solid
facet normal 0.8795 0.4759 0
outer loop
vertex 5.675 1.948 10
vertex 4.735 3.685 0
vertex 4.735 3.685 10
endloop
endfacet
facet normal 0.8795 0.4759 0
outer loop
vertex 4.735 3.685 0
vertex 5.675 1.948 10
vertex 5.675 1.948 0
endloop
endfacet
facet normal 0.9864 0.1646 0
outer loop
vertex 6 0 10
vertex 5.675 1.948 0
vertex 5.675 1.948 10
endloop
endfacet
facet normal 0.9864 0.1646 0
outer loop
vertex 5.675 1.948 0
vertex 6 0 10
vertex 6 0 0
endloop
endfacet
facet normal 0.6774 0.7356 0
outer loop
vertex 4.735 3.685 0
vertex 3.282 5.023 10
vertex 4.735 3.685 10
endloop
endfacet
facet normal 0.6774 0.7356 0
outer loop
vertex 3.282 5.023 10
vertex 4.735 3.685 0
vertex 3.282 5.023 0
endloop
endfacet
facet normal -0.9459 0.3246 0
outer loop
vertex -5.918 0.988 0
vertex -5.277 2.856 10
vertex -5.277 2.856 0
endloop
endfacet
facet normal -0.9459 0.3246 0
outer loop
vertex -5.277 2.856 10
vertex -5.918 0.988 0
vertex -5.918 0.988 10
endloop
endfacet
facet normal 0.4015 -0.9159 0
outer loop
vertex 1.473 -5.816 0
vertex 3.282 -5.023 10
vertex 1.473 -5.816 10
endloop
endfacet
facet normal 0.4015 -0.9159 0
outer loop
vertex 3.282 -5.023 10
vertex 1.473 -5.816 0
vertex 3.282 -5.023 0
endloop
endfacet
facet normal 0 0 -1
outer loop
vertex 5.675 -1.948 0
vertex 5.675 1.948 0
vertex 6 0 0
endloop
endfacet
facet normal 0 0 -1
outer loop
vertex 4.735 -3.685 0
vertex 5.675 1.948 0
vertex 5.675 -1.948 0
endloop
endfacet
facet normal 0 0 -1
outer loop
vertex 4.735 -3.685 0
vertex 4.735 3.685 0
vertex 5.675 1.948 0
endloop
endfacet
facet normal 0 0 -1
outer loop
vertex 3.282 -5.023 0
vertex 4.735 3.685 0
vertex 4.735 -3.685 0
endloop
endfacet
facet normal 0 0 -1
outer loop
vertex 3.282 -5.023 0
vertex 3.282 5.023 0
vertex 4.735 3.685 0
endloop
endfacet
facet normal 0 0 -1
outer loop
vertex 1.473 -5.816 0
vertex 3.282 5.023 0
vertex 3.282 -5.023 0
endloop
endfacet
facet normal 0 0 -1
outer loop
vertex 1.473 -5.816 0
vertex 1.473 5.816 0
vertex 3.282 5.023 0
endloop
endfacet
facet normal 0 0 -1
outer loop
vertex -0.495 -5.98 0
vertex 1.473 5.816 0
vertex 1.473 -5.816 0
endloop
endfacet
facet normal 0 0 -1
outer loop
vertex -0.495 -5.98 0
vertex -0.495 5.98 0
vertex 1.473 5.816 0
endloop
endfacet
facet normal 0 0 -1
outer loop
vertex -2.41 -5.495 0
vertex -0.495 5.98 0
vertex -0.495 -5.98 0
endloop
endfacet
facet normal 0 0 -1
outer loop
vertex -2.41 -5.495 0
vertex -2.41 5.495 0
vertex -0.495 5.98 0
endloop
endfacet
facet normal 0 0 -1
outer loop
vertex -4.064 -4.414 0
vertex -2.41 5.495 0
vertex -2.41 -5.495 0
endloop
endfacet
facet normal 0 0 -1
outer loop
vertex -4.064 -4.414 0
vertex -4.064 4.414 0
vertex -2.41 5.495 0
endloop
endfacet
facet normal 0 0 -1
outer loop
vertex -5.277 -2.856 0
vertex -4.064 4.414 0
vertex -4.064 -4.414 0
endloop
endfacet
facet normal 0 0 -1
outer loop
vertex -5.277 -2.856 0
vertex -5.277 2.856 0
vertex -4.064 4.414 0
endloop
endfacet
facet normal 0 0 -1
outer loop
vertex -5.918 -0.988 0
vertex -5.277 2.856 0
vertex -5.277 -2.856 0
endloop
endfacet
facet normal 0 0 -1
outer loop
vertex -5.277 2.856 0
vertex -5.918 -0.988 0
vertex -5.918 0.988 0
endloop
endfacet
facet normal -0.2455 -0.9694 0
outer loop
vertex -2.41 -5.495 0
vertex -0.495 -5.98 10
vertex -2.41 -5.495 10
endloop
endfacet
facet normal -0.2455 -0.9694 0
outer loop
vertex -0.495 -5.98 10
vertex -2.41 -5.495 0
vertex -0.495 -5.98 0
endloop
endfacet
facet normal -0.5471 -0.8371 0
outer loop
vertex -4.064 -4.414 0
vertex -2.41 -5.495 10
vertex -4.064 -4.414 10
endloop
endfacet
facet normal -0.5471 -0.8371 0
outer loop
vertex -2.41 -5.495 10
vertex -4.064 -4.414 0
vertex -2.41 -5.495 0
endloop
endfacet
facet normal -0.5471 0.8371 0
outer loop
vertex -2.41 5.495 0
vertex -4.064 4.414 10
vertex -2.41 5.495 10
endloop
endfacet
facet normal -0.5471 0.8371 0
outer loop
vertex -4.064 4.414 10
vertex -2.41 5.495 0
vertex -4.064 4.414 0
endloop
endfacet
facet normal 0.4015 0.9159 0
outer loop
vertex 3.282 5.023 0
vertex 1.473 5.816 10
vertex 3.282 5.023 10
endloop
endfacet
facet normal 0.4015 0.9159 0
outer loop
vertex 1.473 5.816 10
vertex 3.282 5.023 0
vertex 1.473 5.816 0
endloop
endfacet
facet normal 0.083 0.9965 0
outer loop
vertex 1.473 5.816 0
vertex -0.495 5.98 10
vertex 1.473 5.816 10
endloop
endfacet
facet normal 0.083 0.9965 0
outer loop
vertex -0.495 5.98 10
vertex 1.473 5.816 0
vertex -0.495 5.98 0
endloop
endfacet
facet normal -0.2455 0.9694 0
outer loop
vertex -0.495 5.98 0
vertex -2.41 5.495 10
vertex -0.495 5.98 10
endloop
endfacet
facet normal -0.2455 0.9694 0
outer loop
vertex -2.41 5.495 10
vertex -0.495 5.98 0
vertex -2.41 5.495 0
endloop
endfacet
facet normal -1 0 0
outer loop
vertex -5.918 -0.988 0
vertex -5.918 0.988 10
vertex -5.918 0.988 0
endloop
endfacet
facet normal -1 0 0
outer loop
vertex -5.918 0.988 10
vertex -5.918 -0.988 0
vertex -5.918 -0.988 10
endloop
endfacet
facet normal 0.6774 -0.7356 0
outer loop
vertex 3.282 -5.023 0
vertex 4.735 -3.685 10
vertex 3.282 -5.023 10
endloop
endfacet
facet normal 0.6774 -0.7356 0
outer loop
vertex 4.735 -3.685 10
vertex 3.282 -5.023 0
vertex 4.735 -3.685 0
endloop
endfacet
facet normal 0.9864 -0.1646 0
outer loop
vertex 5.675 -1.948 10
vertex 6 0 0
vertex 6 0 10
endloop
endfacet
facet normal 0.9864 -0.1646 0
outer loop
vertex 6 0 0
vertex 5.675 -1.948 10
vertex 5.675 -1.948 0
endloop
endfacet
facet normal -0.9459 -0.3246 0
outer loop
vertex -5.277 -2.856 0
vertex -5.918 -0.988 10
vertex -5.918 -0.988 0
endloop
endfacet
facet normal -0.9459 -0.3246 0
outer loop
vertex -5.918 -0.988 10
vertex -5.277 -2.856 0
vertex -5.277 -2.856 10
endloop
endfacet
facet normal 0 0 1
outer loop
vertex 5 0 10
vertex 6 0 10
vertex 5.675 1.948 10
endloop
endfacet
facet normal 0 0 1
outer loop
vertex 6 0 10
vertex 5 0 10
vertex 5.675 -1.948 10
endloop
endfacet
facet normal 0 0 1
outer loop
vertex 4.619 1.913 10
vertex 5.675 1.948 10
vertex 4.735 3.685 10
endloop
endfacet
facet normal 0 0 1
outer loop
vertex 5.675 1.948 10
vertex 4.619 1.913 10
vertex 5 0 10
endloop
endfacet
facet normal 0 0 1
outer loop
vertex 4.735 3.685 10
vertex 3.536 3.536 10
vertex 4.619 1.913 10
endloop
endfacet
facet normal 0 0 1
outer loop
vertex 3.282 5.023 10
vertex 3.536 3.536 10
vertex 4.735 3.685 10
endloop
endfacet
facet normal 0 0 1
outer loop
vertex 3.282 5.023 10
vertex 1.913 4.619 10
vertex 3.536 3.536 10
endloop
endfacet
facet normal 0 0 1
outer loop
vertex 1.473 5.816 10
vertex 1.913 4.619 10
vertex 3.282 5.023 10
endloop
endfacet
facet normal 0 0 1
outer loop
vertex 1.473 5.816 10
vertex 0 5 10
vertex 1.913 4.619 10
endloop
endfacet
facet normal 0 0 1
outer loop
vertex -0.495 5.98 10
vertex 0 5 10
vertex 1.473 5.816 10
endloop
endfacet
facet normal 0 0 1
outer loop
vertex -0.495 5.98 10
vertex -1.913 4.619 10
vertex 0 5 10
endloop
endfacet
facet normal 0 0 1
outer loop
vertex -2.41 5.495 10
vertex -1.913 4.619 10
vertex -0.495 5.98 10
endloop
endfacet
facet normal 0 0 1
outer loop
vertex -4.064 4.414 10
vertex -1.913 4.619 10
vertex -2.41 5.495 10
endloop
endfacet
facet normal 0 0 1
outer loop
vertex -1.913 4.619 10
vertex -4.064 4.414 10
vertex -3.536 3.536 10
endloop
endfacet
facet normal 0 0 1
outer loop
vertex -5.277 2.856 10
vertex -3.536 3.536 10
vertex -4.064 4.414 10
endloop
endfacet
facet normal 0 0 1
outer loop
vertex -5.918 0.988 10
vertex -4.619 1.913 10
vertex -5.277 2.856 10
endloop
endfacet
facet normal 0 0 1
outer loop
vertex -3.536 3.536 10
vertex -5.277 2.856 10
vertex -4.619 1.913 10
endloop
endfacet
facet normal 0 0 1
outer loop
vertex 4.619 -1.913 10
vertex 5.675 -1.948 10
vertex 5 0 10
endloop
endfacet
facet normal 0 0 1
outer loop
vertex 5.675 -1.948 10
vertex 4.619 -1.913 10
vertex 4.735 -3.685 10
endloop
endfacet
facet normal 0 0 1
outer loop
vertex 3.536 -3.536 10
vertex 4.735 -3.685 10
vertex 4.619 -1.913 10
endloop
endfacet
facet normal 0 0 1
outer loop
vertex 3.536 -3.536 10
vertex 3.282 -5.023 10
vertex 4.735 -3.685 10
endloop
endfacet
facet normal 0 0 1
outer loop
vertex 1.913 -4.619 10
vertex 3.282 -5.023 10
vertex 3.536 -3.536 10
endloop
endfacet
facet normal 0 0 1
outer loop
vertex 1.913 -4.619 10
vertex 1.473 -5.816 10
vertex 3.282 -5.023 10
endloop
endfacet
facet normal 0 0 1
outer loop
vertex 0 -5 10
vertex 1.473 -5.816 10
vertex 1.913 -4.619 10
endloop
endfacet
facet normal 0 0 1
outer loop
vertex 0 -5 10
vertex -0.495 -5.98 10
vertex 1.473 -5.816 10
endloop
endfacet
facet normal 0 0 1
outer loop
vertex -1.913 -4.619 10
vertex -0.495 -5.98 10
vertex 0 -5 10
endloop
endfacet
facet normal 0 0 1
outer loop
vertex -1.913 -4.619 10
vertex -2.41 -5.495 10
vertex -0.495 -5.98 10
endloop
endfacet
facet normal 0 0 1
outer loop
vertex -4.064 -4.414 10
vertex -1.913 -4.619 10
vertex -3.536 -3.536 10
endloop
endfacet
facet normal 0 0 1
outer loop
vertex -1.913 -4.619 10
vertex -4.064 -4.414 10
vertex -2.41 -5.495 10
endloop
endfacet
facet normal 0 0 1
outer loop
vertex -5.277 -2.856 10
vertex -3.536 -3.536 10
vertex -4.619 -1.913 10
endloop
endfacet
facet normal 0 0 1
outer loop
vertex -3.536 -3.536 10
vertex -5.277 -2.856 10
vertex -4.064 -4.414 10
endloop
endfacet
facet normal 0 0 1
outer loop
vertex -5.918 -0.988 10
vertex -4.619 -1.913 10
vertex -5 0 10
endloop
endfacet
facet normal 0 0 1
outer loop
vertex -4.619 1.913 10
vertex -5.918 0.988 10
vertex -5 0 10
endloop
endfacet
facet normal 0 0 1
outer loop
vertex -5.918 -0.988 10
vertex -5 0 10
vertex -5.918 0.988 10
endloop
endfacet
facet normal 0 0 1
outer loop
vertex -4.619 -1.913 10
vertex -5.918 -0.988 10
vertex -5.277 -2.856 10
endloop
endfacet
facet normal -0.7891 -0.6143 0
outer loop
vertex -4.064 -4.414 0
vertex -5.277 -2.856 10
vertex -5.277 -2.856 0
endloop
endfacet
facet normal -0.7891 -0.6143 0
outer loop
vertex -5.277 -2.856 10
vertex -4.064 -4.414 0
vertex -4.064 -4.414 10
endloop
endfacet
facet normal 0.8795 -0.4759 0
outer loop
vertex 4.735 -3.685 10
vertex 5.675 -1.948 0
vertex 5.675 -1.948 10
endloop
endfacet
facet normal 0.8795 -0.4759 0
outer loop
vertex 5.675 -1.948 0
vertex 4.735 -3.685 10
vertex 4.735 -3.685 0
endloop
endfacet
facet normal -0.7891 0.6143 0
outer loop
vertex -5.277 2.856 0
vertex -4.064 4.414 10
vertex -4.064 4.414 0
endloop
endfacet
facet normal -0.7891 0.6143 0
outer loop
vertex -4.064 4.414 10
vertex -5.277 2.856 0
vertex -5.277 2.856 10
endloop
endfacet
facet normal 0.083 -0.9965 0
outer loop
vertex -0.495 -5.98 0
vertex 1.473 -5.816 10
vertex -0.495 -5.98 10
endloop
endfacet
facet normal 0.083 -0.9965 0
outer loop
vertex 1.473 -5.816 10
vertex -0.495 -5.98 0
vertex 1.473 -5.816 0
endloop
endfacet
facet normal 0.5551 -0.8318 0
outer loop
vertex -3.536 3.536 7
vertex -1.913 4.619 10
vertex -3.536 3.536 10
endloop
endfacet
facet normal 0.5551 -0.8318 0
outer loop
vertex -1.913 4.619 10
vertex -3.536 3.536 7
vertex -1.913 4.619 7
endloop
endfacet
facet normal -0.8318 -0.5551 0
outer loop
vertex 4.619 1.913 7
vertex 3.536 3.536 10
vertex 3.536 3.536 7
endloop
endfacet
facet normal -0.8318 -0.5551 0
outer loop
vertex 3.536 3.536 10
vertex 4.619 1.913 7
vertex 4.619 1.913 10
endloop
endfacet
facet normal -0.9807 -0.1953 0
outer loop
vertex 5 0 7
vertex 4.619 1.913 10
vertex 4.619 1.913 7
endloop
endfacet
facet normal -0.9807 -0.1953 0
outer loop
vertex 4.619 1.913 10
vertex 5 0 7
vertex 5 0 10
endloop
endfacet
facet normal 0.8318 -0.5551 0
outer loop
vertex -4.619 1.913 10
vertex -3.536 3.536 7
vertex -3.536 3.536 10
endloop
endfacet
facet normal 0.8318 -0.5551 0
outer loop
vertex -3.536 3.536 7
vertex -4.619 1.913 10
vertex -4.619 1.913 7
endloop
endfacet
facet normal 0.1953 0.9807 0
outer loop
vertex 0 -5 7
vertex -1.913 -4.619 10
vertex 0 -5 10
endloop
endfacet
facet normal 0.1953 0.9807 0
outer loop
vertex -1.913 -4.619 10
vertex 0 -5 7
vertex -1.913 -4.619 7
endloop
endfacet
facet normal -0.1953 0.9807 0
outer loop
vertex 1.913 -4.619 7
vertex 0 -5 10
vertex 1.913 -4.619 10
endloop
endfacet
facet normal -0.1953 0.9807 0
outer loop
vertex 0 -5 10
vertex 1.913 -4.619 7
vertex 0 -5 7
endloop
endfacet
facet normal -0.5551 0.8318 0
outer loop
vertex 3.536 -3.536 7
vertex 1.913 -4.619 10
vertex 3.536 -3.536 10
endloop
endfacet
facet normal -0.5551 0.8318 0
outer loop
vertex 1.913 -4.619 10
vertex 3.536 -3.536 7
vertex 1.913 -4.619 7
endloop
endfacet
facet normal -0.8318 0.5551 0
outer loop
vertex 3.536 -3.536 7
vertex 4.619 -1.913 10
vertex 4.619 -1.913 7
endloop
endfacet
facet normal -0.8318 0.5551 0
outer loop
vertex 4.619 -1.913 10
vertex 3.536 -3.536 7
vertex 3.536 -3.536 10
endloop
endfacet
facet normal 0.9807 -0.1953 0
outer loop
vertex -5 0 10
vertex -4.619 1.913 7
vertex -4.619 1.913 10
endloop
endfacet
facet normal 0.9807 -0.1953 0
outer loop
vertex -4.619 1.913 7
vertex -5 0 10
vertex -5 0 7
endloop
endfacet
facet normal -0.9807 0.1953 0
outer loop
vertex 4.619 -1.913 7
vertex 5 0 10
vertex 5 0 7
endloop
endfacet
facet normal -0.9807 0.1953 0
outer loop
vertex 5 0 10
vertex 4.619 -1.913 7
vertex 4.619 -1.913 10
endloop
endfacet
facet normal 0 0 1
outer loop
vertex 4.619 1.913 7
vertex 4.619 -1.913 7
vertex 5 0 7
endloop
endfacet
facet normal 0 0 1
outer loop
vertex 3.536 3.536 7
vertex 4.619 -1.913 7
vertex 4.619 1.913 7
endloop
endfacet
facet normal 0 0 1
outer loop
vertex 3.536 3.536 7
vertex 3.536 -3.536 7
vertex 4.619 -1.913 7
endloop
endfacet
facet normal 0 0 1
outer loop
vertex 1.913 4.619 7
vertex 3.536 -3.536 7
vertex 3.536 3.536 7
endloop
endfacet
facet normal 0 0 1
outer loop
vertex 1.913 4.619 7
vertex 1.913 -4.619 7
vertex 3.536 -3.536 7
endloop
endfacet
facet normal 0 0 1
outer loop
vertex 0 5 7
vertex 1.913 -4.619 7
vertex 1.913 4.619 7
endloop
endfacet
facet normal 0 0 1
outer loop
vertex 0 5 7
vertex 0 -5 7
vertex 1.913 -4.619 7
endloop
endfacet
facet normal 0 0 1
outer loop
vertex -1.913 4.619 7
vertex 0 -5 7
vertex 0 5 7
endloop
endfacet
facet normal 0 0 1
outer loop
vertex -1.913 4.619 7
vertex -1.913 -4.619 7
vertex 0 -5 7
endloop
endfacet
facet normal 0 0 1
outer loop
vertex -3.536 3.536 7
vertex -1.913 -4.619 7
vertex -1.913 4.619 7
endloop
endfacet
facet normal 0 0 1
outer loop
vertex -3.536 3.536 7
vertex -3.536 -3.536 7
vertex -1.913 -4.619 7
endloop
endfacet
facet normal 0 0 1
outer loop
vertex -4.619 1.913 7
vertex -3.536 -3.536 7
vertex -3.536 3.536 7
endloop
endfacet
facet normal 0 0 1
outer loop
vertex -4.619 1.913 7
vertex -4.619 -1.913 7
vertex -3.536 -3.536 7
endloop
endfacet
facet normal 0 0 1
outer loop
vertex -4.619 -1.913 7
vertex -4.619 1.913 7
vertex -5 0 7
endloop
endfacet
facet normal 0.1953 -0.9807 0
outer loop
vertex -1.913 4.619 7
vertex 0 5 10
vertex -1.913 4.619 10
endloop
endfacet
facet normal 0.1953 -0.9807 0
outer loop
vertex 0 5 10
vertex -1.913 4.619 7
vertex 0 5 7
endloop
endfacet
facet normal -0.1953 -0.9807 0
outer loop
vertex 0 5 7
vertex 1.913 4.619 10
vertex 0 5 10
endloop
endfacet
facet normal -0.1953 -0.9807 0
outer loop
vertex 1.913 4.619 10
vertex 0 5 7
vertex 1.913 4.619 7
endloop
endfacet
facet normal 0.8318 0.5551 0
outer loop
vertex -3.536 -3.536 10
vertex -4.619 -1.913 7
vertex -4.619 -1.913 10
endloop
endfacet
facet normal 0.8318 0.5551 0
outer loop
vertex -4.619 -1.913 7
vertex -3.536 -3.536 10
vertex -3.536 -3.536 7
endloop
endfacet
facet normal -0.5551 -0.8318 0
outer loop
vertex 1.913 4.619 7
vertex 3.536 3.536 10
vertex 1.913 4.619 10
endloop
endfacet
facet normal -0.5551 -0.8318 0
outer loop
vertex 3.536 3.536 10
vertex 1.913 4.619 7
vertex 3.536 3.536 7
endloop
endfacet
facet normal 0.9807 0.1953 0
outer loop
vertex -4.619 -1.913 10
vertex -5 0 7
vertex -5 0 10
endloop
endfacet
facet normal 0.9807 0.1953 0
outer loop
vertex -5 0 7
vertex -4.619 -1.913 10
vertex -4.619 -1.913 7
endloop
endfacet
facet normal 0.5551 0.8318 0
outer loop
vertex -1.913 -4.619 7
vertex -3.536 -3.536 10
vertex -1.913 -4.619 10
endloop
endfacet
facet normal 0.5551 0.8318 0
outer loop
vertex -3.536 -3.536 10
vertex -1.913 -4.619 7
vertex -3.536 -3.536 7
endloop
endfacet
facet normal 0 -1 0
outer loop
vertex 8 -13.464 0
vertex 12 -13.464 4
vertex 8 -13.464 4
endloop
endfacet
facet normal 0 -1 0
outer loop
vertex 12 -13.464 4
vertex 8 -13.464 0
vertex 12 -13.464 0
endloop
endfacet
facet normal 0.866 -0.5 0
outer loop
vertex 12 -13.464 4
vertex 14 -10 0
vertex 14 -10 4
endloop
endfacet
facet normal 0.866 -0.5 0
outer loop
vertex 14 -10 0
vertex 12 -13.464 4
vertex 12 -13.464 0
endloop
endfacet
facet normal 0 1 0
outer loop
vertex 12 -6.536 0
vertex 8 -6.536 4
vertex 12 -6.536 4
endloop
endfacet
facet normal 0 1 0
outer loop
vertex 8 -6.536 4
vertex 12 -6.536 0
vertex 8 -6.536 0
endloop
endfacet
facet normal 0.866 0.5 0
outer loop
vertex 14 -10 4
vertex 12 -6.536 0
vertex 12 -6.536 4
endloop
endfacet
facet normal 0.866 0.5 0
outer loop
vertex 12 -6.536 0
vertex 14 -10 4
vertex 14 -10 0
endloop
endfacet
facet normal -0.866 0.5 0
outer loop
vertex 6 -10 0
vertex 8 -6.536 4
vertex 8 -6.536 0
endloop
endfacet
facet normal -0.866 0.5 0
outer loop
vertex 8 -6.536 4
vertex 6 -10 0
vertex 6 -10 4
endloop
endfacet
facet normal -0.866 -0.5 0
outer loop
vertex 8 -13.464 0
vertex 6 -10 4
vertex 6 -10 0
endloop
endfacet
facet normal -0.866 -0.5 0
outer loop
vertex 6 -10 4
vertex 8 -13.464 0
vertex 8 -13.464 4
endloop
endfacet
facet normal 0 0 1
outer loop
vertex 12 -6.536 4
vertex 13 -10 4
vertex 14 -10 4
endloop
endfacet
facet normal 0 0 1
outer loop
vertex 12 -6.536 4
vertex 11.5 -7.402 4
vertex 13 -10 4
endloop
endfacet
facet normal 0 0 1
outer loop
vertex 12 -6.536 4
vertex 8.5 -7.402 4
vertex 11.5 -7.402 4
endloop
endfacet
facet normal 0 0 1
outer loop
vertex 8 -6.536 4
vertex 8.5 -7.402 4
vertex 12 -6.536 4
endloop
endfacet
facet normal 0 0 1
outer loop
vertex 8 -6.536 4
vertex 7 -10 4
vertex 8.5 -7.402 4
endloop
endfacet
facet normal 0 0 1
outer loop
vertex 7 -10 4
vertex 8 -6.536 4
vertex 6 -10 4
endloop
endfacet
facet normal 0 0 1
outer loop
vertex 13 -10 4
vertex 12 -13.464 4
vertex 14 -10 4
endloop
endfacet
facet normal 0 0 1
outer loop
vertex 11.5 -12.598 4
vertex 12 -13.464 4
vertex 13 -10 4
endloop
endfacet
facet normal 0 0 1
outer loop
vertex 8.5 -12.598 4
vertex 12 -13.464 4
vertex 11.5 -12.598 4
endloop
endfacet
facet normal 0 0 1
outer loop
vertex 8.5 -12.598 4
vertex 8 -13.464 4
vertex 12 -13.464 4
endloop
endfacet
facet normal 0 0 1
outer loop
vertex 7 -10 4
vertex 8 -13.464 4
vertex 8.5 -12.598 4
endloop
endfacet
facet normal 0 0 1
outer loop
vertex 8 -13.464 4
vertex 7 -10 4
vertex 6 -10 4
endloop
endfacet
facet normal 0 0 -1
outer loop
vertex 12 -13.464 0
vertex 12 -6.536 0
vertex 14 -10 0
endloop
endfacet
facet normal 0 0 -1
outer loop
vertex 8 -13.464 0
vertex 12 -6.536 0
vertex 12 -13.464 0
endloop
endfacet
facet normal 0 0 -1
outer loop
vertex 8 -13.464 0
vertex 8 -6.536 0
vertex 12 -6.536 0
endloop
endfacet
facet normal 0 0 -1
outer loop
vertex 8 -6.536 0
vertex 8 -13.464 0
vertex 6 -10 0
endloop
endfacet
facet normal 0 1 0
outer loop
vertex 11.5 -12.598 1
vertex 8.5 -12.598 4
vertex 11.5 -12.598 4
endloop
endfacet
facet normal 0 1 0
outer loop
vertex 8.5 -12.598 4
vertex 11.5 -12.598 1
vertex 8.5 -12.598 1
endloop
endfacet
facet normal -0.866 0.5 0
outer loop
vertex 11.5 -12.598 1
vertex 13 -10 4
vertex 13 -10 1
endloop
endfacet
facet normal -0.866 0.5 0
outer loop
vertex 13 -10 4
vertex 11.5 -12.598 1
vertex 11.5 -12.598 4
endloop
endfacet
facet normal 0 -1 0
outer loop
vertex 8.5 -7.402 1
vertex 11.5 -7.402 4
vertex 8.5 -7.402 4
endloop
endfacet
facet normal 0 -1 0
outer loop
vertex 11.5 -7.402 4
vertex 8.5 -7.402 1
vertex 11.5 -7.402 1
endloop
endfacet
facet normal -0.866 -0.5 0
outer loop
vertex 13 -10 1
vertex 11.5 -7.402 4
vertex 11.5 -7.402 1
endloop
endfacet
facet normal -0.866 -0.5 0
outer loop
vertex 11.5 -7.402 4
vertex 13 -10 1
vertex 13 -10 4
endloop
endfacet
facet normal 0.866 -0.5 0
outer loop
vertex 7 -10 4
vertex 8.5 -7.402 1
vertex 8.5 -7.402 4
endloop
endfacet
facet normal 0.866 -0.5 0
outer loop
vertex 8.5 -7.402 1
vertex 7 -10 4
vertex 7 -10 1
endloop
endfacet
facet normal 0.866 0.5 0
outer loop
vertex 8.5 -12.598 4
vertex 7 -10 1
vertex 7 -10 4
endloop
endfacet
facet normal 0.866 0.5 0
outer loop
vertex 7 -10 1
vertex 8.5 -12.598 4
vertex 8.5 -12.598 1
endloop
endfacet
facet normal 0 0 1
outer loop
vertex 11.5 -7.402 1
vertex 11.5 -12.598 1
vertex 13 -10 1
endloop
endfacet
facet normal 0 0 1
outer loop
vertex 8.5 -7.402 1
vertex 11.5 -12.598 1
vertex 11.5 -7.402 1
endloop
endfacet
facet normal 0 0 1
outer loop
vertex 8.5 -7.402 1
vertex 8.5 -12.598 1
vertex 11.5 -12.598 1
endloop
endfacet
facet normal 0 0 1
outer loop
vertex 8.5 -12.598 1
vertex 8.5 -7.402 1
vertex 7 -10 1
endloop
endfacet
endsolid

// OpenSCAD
module cup(height, height2, radius, radius2)
{
	difference()
	{
		cylinder(height, radius, radius);
		translate([0,0,height-height2])
		cylinder(height2, radius2, radius2);
	}



}


cup(10,3,6,5);
translate([10,-10,0])cup(4,3,4,3, $fn=6);
